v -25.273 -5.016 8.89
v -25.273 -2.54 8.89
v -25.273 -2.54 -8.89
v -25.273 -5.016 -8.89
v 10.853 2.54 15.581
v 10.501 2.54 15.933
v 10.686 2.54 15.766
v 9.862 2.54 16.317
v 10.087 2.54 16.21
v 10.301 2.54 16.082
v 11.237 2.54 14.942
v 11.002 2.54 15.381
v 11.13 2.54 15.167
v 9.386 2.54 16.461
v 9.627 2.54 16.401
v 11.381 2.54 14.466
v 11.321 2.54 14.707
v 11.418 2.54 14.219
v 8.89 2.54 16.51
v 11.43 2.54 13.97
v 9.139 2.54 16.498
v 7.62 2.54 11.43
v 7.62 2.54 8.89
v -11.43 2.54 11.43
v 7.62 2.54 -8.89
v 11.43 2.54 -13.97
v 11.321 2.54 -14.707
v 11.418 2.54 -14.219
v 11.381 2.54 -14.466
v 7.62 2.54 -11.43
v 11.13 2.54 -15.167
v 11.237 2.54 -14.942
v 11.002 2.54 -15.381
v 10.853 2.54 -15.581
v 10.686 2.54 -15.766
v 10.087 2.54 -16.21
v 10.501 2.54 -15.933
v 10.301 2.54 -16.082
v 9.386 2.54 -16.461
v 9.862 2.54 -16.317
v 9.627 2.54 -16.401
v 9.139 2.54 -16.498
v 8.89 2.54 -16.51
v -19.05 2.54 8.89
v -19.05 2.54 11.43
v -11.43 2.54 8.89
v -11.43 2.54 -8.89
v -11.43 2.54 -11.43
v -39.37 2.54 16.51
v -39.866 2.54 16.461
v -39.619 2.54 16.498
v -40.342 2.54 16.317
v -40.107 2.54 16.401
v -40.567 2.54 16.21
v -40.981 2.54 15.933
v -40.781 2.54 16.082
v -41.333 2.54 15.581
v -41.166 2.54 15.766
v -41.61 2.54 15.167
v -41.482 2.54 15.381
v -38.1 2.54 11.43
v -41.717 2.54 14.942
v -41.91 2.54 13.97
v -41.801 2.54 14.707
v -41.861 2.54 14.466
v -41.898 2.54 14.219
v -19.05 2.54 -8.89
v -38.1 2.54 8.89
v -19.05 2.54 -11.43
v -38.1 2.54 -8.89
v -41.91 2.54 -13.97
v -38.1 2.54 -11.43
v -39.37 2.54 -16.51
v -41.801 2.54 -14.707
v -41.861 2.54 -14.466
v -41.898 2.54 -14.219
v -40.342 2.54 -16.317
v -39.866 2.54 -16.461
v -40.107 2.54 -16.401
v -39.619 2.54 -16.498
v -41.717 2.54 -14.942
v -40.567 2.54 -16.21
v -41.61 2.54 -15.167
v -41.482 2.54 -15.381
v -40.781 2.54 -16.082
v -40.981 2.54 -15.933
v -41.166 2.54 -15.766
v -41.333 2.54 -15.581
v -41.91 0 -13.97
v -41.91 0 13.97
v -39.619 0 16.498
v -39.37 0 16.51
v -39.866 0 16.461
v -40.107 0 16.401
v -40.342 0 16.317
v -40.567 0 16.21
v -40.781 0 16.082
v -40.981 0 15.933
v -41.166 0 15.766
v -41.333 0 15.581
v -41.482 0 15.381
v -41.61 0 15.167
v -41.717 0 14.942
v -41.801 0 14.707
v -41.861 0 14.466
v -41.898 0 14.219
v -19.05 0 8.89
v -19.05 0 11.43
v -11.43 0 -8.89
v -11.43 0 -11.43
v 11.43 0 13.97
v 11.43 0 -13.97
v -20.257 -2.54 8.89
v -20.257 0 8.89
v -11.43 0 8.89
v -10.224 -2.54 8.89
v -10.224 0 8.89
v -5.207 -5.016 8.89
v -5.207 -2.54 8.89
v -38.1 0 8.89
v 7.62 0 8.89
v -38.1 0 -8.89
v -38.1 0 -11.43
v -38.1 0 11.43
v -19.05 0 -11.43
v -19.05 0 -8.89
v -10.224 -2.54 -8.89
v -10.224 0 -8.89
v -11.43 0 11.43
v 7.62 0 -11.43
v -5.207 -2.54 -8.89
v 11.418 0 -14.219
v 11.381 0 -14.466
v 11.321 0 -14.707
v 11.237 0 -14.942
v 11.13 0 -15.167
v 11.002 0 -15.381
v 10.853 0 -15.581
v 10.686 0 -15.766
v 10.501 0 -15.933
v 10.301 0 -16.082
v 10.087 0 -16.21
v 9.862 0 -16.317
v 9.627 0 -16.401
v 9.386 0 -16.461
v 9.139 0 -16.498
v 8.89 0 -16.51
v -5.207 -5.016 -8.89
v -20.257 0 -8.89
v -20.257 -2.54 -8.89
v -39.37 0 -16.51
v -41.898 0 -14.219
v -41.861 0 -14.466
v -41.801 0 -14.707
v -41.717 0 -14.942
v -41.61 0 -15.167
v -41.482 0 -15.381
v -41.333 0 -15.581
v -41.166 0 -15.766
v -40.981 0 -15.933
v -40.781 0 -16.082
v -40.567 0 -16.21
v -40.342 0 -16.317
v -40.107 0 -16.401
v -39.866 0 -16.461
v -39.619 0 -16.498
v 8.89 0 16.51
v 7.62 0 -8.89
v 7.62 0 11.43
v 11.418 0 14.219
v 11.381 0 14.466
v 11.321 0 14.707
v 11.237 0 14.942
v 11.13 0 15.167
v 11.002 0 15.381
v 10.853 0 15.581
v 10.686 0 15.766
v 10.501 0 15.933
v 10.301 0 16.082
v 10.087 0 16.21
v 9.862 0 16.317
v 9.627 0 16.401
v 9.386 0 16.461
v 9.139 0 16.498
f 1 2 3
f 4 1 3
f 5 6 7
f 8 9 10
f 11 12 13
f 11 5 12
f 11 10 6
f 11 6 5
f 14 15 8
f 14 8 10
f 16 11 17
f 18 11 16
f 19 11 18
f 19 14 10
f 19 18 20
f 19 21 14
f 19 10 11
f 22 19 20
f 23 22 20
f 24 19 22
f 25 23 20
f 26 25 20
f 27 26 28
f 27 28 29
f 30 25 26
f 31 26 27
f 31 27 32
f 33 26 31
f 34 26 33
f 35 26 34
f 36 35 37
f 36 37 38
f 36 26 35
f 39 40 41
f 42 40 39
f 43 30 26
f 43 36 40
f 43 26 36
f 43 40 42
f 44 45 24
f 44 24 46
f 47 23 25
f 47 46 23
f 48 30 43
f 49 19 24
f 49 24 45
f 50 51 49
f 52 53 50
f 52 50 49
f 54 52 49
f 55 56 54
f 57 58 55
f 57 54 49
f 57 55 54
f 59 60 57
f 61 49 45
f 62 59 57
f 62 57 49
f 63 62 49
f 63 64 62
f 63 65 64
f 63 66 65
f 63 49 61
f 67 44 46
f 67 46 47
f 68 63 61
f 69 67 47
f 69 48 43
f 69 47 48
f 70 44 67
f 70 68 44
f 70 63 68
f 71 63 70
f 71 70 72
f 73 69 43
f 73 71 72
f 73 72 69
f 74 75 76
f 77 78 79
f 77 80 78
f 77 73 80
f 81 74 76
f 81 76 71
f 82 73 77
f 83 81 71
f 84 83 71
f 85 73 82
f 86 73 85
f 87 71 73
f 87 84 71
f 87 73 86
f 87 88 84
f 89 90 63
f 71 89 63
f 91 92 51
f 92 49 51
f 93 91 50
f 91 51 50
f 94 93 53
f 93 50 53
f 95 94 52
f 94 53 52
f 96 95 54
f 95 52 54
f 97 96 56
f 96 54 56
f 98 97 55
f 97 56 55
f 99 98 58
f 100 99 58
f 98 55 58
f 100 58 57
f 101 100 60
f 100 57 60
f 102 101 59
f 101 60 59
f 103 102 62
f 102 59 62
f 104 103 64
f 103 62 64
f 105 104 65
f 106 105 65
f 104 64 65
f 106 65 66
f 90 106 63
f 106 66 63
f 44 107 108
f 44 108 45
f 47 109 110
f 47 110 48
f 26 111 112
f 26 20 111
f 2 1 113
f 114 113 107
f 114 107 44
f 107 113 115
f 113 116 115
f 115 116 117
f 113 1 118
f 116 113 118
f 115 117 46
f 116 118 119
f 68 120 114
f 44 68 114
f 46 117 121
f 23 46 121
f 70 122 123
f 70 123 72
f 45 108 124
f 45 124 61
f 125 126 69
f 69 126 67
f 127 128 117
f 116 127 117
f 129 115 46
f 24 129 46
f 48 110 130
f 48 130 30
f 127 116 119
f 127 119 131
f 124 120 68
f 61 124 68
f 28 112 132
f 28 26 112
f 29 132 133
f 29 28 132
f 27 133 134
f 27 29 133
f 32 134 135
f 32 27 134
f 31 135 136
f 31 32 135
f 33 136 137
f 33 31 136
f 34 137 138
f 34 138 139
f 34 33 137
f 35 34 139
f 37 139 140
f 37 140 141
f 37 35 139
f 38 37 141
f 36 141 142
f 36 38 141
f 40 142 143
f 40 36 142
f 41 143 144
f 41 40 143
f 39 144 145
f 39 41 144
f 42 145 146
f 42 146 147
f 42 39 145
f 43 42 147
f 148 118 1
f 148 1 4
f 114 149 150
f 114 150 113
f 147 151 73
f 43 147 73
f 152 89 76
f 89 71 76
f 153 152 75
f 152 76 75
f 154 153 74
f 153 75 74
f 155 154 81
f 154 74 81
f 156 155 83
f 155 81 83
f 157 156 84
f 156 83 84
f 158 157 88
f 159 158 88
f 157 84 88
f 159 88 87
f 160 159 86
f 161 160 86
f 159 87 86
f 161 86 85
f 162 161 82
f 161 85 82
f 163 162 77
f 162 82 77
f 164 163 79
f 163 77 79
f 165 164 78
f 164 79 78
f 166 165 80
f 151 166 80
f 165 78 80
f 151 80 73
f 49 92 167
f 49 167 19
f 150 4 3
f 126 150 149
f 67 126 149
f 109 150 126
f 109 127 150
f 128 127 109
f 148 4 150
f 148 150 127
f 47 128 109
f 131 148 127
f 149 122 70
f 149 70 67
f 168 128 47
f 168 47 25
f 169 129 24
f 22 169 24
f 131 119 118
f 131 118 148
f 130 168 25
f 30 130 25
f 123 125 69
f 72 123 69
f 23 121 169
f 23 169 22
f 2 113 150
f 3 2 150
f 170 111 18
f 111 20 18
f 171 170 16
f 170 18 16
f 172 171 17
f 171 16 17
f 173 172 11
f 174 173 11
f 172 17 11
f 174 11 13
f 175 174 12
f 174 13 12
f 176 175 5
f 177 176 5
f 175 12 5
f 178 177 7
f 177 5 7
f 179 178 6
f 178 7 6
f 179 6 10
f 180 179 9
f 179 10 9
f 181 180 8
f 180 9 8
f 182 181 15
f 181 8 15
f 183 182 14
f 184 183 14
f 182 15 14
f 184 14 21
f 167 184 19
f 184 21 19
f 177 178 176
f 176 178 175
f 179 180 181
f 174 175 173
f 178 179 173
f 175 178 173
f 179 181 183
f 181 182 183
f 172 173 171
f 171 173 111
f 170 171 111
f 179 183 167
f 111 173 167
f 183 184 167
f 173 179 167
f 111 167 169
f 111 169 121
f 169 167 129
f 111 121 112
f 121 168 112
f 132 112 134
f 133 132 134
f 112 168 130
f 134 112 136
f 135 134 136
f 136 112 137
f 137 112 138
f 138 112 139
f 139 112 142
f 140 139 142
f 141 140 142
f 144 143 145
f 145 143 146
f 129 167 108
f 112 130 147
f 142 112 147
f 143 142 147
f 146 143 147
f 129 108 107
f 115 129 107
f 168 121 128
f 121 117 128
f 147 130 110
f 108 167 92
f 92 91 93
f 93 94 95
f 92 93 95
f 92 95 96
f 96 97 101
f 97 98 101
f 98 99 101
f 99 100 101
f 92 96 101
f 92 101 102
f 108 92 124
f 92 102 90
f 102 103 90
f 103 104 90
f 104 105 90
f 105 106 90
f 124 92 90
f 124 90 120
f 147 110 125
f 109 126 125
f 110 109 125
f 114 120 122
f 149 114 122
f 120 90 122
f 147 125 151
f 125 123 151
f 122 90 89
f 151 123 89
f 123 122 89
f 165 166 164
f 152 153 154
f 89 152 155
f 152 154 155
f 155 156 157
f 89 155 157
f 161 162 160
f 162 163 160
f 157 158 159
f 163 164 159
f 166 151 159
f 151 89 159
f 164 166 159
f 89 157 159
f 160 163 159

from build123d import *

# Parameters (mm, degrees)
SKETCH1_W               = 17.78
SKETCH1_H               = 2.54
BOSS_EXTRUDE1_DEPTH     = 11.43
SKETCH2_W               = 17.78
SKETCH2_H               = 2.54
BOSS_EXTRUDE2_DEPTH     = 15.24
SKETCH16_W              = 3.81
SKETCH16_H              = 2.54
BOSS_EXTRUDE10_DEPTH    = 7.62
BOSS_EXTRUDE11_REACH    = 36.757
SKETCH17_W              = 5.08
SKETCH17_H              = 2.54
MIRROR3_COPY_1_SKETCH_W = 3.81
MIRROR3_COPY_1_SKETCH_H = 2.54
MIRROR3_COPY_1_DEPTH    = 7.62
MIRROR3_COPY_2_REACH    = 36.757
MIRROR3_COPY_2_SKETCH_W = 5.08
MIRROR3_COPY_2_SKETCH_H = 2.54
FILLET1_R               = 2.54
SKETCH18_W              = 5.0165
SKETCH18_H              = 17.78
BOSS_EXTRUDE12_DEPTH    = 5.0165
SKETCH19_W              = 17.78
SKETCH19_H              = 2.4765
BOSS_EXTRUDE13_DEPTH    = 5.0165


with BuildPart() as part:
    # Sketch1 → Boss-Extrude1 (new body)
    with BuildSketch(Plane(origin=(0, 0, 0), x_dir=(0, 0, -1), z_dir=(1, 0, 0))):
        with Locations((0, 1.27)):
            Rectangle(SKETCH1_W, SKETCH1_H)
    extrude(amount=BOSS_EXTRUDE1_DEPTH)

    # Sketch2 → Boss-Extrude2 (add)
    with BuildSketch(Plane.ZY):
        with Locations((0, 1.27)):
            Rectangle(SKETCH2_W, SKETCH2_H)
    extrude(amount=BOSS_EXTRUDE2_DEPTH)

    # Mirror1: part across plane


with BuildPart() as part_1:
    add(part.part)
    add(part.part.mirror(Plane.ZY.offset(15.24)))

    # Sketch16 → Boss-Extrude10 (add)
    with BuildSketch(Plane.XY.offset(8.89)):
        with Locations((-17.145, 1.27)):
            Rectangle(SKETCH16_W, SKETCH16_H)
        with Locations((-40.005, 1.27)):
            Rectangle(SKETCH16_W, SKETCH16_H)
    boss_extrude10 = extrude(amount=BOSS_EXTRUDE10_DEPTH)

    # Sketch17 → Boss-Extrude11 (add, up to next)
    with BuildSketch(Plane.ZY.offset(19.05), mode=Mode.PRIVATE) as boss_extrude11_sk1:
        with Locations((13.97, 1.27)):
            Rectangle(SKETCH17_W, SKETCH17_H)
    boss_extrude11_tool1 = extrude(boss_extrude11_sk1.sketch, amount=BOSS_EXTRUDE11_REACH, mode=Mode.PRIVATE) - part_1.part
    boss_extrude11 = boss_extrude11_tool1.solids().sort_by_distance((-19.05, 1.27, 13.97))[0]
    add(boss_extrude11)

    # Mirror2: Boss-Extrude10, Boss-Extrude11 across plane
    add(boss_extrude10.mirror(Plane.ZY.offset(15.24)))
    add(boss_extrude11.mirror(Plane.ZY.offset(15.24)))

    # Mirror3: Boss-Extrude10, Boss-Extrude11 across plane
    add(boss_extrude10.mirror(Plane.XY))
    add(boss_extrude11.mirror(Plane.XY))

    # Mirror3 copy 1 sketch → Mirror3 copy 1 (add)
    with BuildSketch(Plane(origin=(-30.48, 0, -8.89), x_dir=(-1, 0, 0), z_dir=(0, 0, -1))):
        with Locations((-17.145, 1.27)):
            Rectangle(MIRROR3_COPY_1_SKETCH_W, MIRROR3_COPY_1_SKETCH_H)
        with Locations((-40.005, 1.27)):
            Rectangle(MIRROR3_COPY_1_SKETCH_W, MIRROR3_COPY_1_SKETCH_H)
    extrude(amount=MIRROR3_COPY_1_DEPTH)

    # Mirror3 copy 2 sketch → Mirror3 copy 2 (add, up to next)
    with BuildSketch(Plane(origin=(-11.43, 0, 0), x_dir=(0, 0, -1), z_dir=(1, 0, 0)), mode=Mode.PRIVATE) as mirror3_copy_2_sk1:
        with Locations((13.97, 1.27)):
            Rectangle(MIRROR3_COPY_2_SKETCH_W, MIRROR3_COPY_2_SKETCH_H)
    mirror3_copy_2_tool1 = extrude(mirror3_copy_2_sk1.sketch, amount=MIRROR3_COPY_2_REACH, mode=Mode.PRIVATE) - part_1.part
    add(mirror3_copy_2_tool1.solids().sort_by_distance((-11.43, 1.27, -13.97))[0])

    # Fillet1
    fillet1_edges = [part_1.edges().sort_by_distance(p)[0] for p in [
        (-41.91, 1.27, -16.51),
        (11.43, 1.27, -16.51),
        (-41.91, 1.27, 16.51),
        (11.43, 1.27, 16.51),
    ]]
    fillet(fillet1_edges, radius=FILLET1_R)

    # Sketch18 → Boss-Extrude12 (add)
    with BuildSketch(Plane.XZ):
        with Locations((-12.73175, 0)):
            Rectangle(SKETCH18_W, SKETCH18_H)
    boss_extrude12 = extrude(amount=BOSS_EXTRUDE12_DEPTH)

    # Sketch19 → Boss-Extrude13 (add)
    with BuildSketch(Plane(origin=(-10.2235, 0, 0), x_dir=(0, 0, -1), z_dir=(1, 0, 0))):
        with Locations((0, -3.77825)):
            Rectangle(SKETCH19_W, SKETCH19_H)
    boss_extrude13 = extrude(amount=BOSS_EXTRUDE13_DEPTH)

    # Mirror4: Boss-Extrude12, Boss-Extrude13 across plane
    add(boss_extrude12.mirror(Plane.ZY.offset(15.24)))
    add(boss_extrude13.mirror(Plane.ZY.offset(15.24)))


solid = part_1.part
